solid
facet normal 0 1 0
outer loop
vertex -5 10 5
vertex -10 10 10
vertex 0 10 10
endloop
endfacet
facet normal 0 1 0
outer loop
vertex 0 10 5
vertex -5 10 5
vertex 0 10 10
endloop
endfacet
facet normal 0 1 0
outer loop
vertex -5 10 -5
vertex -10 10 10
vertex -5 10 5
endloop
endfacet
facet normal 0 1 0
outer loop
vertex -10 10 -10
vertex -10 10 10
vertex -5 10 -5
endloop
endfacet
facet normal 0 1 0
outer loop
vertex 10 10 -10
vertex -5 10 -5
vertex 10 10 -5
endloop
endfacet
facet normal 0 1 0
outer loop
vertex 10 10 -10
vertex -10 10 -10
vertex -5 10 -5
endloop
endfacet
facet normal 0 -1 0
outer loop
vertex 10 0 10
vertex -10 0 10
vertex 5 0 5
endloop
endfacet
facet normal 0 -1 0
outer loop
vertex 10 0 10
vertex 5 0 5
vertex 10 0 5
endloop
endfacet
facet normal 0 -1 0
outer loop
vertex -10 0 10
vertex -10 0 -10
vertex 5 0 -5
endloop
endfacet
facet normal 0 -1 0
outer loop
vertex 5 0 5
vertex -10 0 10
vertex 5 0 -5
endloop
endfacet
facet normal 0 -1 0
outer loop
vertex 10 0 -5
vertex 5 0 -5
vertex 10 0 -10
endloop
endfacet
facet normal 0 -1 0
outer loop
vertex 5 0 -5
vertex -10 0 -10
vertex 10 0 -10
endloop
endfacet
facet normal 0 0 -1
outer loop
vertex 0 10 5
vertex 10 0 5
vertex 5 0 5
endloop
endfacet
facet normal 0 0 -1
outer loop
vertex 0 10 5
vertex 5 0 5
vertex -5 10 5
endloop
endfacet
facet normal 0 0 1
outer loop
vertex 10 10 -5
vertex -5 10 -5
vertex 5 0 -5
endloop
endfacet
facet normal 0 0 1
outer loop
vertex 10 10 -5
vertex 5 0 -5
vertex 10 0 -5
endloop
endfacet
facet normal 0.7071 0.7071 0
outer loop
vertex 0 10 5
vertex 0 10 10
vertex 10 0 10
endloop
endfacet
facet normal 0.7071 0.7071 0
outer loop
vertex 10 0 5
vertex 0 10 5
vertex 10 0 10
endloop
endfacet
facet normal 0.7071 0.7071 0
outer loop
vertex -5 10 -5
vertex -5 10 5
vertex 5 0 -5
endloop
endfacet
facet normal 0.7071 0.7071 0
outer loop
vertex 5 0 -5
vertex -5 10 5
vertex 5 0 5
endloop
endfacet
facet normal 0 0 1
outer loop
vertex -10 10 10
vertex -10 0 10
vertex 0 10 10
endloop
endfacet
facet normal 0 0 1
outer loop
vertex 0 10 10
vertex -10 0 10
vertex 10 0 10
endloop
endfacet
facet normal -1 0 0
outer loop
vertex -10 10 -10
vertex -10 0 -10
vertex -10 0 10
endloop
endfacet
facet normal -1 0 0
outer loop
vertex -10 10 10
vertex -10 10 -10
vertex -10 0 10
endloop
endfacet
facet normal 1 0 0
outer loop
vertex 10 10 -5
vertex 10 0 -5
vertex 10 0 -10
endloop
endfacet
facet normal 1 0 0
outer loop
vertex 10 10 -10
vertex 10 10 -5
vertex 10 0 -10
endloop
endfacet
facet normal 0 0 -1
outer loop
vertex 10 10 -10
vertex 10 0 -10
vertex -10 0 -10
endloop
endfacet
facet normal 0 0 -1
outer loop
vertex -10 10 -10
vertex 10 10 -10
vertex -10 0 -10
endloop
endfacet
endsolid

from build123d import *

# Parameters (mm, degrees)
EXTRUDE_1_DEPTH     = 10
CUT_EXTRUDE_START   = -5
CUT_EXTRUDE_1_DEPTH = 10
CUT_EXTRUDE_2_DEPTH = 5


with BuildPart() as part:
    # 草圖1 → 填料-伸長1 (new body)
    with BuildSketch(Plane(origin=(0, 0, 0), x_dir=(1, 0, 0), z_dir=(0, 1, 0))):
        Polygon((10, 5), (10, 10), (-10, 10), (-10, -10), (10, -10), (10, -5), (5, -5), (5, 5), align=None)
    extrude(amount=EXTRUDE_1_DEPTH)

    # 草圖2 → 除料-伸長1 (cut)
    with BuildSketch(Plane.XY.offset(10).offset(CUT_EXTRUDE_START)):
        Polygon((10, 0), (10, 10), (-5, 10), (5, 0), align=None)
    extrude(amount=-CUT_EXTRUDE_1_DEPTH, mode=Mode.SUBTRACT)

    # 草圖3 → 除料-伸長2 (cut)
    with BuildSketch(Plane.XY.offset(10)):
        Polygon((0, 10), (10, 0), (10, 10), align=None)
    extrude(amount=-CUT_EXTRUDE_2_DEPTH, mode=Mode.SUBTRACT)


solid = part.part
